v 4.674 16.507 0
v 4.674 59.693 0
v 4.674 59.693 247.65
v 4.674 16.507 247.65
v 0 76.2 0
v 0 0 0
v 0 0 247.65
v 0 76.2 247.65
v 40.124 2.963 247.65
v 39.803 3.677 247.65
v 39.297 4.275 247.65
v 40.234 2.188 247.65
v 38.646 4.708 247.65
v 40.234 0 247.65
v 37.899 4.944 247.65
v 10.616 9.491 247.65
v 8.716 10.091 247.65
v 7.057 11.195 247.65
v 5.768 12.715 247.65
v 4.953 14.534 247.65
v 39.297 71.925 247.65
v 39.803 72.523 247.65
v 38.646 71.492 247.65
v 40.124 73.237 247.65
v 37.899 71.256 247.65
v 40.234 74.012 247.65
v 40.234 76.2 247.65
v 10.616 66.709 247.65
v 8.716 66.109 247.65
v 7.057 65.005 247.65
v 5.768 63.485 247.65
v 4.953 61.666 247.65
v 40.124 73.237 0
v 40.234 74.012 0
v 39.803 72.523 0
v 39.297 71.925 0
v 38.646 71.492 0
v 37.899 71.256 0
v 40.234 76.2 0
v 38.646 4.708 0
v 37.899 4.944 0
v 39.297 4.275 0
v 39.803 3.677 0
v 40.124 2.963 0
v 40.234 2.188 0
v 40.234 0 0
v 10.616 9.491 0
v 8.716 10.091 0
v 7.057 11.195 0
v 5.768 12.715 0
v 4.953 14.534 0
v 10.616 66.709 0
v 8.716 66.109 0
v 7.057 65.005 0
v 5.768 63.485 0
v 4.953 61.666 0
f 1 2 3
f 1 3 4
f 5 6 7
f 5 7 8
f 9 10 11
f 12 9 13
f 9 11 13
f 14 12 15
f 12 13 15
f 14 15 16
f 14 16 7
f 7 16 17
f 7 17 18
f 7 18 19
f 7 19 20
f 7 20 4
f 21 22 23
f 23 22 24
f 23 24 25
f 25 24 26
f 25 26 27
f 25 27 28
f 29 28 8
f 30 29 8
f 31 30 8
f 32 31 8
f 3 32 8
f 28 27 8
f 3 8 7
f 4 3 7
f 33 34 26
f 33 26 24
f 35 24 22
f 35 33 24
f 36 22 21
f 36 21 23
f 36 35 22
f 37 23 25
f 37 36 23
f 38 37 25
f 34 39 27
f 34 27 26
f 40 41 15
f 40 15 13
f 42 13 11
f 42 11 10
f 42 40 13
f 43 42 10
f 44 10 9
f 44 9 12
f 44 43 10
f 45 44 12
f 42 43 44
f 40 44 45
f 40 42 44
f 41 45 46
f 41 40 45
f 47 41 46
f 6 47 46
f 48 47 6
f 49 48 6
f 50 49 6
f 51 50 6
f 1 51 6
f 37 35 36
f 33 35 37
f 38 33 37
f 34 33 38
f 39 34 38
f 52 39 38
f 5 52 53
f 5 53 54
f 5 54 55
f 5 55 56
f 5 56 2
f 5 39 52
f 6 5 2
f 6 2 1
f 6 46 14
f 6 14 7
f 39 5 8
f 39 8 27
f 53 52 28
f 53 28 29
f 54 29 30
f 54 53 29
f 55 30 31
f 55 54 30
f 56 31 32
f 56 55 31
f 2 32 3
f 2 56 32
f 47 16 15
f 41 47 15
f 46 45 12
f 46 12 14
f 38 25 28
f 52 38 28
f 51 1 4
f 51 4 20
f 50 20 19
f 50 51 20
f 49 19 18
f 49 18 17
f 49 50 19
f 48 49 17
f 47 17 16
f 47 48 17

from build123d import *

# Parameters (mm, degrees)
BOSS_EXTRUDE1_DEPTH = 247.65


with BuildPart() as part:
    # Sketch1 → Boss-Extrude1 (new body)
    with BuildSketch(Plane.XY):
        with BuildLine():
            Line((0, 0), (0, 76.2))
            Line((0, 76.2), (40.2336, 76.2))
            Line((40.2336, 76.2), (40.2336, 74.011994208))
            ThreePointArc((40.2336, 74.011994208), (39.571488513, 72.206035358), (37.898963373, 71.256015019))
            Line((37.898963373, 71.256015019), (10.616311414, 66.708574647))
            ThreePointArc((10.616311414, 66.708574647), (6.358974694, 64.290341057), (4.6736, 59.693354893))
            Line((4.6736, 59.693354893), (4.6736, 16.506645107))
            ThreePointArc((4.6736, 16.506645107), (6.358974694, 11.909658943), (10.616311414, 9.491425353))
            Line((10.616311414, 9.491425353), (37.898963373, 4.943984981))
            ThreePointArc((37.898963373, 4.943984981), (39.571488513, 3.993964642), (40.2336, 2.188005792))
            Line((40.2336, 2.188005792), (40.2336, 0))
            Line((40.2336, 0), (0, 0))
        make_face()
    extrude(amount=BOSS_EXTRUDE1_DEPTH)


solid = part.part
